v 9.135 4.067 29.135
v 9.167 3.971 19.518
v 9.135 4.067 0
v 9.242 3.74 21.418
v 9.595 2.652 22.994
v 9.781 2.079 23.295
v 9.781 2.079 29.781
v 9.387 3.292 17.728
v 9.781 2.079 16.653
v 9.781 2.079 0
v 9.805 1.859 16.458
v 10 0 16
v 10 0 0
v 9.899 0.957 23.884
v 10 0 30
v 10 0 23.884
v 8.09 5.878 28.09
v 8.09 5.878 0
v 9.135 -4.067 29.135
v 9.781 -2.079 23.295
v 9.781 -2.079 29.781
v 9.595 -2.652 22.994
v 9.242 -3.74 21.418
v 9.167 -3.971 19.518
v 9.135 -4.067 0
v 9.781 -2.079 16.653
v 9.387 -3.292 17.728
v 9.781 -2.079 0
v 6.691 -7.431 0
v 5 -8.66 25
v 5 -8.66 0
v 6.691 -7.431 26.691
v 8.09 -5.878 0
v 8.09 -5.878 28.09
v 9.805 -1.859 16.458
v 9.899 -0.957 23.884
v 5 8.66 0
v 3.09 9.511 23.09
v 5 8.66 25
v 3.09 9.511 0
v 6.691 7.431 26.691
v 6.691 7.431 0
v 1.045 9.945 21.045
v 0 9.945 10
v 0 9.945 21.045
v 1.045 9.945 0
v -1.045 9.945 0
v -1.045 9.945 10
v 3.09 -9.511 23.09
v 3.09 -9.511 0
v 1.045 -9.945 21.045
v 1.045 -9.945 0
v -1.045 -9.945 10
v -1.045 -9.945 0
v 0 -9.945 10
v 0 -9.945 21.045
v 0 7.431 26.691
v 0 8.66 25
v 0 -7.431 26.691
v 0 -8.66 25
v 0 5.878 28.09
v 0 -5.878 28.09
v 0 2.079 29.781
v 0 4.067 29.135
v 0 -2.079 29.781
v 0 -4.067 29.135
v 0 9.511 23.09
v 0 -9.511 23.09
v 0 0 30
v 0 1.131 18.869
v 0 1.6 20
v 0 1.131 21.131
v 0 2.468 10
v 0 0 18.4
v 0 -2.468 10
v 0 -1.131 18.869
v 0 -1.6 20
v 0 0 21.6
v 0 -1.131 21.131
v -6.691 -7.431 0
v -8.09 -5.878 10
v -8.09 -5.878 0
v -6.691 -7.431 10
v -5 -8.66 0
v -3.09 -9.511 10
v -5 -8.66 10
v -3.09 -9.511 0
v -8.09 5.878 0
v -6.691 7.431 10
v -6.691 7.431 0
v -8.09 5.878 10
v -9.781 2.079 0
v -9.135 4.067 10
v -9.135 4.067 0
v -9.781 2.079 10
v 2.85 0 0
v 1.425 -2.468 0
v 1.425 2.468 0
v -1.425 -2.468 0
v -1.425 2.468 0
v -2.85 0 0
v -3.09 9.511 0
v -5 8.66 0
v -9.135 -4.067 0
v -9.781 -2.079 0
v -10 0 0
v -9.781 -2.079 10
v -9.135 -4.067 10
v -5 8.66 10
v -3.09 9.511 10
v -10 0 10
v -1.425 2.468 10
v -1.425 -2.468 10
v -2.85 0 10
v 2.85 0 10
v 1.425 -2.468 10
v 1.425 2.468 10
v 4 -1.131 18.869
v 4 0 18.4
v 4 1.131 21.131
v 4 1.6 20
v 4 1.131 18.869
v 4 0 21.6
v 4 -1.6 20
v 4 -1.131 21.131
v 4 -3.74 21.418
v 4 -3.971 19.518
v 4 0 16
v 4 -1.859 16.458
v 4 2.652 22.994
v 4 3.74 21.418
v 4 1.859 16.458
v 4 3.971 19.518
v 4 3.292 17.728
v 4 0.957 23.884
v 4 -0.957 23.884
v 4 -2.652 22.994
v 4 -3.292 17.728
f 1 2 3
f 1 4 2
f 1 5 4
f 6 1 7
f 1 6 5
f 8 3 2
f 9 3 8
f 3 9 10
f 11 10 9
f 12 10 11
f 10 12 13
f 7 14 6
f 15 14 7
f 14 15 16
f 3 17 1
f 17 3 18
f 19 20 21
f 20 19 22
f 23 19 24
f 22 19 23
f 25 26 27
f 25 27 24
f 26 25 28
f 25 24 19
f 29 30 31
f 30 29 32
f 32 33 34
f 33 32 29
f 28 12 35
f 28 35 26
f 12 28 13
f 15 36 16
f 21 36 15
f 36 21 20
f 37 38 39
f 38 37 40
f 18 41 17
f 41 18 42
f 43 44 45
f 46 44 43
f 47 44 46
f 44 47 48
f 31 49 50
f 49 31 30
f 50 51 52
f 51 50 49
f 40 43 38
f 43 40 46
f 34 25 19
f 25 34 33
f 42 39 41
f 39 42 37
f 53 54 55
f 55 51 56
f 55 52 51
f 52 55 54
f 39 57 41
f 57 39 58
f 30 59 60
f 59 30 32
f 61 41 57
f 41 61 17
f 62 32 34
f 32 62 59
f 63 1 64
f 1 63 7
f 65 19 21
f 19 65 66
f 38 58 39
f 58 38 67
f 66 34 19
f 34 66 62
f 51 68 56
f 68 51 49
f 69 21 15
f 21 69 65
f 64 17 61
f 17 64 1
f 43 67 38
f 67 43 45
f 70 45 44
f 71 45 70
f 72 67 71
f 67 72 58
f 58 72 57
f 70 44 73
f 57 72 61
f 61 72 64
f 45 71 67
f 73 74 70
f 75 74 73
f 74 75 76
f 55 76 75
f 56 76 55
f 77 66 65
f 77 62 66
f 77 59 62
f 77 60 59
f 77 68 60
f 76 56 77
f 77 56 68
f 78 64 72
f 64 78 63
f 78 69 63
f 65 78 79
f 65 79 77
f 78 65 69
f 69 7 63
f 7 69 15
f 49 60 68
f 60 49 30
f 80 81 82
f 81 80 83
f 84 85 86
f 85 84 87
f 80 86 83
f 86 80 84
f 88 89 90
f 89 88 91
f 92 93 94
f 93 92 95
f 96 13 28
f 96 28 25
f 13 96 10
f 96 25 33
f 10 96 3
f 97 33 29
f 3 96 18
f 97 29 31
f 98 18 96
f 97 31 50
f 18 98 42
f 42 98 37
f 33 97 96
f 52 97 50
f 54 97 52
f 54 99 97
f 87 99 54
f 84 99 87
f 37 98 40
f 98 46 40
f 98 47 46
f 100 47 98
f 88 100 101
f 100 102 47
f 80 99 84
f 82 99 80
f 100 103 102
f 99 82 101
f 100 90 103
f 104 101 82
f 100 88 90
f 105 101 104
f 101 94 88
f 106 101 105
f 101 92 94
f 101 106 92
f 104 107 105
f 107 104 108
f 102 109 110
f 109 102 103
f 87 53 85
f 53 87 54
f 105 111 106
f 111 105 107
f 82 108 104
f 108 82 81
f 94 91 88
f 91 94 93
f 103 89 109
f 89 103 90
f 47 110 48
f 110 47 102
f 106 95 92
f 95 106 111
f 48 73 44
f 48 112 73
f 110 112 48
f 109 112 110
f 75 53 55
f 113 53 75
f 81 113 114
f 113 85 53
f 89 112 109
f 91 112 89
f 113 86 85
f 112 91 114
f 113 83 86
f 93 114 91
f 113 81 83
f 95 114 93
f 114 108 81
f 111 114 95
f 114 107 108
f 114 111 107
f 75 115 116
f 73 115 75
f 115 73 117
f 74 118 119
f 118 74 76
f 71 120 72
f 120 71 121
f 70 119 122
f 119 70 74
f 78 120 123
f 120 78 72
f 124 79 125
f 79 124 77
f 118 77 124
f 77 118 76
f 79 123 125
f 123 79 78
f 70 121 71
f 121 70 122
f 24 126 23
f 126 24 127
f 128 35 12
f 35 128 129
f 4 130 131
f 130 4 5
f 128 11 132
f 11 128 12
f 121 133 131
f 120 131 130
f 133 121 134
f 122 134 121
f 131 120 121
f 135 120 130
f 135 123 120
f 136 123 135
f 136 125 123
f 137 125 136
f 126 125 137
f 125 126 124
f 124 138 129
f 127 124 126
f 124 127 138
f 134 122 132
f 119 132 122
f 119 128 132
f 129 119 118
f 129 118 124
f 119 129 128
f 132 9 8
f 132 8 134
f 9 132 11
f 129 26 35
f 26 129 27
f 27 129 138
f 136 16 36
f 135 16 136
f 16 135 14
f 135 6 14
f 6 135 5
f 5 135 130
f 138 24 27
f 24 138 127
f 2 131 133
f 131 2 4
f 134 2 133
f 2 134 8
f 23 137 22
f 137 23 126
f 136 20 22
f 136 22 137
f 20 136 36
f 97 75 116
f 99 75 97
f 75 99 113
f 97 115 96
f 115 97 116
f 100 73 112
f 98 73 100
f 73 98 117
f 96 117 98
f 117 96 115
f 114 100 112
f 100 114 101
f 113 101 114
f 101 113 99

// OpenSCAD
difference(){
    union(){
        cylinder(h=20,d=20);
        translate([0,0,20]){
            intersection(){
                cylinder(h=20,d=20);
                rotate([0,90,0]){
                    cylinder(h=20,d=20);
                }
            }
        }
    }
    
    translate([-10,-10,10]){
        cube([10,20,20]);
    }
    
    translate([0,0,20]) {
        rotate([0,90,0]) {
            cylinder(d=3.2,h=10,$fn=8);
        }
    }

    translate([4,0,20]) {
        rotate([0,90,0]) {
            cylinder(d=8,h=10);
        }
    }    
    
    cylinder(h=10,d=5.7,$fn=6);
}
